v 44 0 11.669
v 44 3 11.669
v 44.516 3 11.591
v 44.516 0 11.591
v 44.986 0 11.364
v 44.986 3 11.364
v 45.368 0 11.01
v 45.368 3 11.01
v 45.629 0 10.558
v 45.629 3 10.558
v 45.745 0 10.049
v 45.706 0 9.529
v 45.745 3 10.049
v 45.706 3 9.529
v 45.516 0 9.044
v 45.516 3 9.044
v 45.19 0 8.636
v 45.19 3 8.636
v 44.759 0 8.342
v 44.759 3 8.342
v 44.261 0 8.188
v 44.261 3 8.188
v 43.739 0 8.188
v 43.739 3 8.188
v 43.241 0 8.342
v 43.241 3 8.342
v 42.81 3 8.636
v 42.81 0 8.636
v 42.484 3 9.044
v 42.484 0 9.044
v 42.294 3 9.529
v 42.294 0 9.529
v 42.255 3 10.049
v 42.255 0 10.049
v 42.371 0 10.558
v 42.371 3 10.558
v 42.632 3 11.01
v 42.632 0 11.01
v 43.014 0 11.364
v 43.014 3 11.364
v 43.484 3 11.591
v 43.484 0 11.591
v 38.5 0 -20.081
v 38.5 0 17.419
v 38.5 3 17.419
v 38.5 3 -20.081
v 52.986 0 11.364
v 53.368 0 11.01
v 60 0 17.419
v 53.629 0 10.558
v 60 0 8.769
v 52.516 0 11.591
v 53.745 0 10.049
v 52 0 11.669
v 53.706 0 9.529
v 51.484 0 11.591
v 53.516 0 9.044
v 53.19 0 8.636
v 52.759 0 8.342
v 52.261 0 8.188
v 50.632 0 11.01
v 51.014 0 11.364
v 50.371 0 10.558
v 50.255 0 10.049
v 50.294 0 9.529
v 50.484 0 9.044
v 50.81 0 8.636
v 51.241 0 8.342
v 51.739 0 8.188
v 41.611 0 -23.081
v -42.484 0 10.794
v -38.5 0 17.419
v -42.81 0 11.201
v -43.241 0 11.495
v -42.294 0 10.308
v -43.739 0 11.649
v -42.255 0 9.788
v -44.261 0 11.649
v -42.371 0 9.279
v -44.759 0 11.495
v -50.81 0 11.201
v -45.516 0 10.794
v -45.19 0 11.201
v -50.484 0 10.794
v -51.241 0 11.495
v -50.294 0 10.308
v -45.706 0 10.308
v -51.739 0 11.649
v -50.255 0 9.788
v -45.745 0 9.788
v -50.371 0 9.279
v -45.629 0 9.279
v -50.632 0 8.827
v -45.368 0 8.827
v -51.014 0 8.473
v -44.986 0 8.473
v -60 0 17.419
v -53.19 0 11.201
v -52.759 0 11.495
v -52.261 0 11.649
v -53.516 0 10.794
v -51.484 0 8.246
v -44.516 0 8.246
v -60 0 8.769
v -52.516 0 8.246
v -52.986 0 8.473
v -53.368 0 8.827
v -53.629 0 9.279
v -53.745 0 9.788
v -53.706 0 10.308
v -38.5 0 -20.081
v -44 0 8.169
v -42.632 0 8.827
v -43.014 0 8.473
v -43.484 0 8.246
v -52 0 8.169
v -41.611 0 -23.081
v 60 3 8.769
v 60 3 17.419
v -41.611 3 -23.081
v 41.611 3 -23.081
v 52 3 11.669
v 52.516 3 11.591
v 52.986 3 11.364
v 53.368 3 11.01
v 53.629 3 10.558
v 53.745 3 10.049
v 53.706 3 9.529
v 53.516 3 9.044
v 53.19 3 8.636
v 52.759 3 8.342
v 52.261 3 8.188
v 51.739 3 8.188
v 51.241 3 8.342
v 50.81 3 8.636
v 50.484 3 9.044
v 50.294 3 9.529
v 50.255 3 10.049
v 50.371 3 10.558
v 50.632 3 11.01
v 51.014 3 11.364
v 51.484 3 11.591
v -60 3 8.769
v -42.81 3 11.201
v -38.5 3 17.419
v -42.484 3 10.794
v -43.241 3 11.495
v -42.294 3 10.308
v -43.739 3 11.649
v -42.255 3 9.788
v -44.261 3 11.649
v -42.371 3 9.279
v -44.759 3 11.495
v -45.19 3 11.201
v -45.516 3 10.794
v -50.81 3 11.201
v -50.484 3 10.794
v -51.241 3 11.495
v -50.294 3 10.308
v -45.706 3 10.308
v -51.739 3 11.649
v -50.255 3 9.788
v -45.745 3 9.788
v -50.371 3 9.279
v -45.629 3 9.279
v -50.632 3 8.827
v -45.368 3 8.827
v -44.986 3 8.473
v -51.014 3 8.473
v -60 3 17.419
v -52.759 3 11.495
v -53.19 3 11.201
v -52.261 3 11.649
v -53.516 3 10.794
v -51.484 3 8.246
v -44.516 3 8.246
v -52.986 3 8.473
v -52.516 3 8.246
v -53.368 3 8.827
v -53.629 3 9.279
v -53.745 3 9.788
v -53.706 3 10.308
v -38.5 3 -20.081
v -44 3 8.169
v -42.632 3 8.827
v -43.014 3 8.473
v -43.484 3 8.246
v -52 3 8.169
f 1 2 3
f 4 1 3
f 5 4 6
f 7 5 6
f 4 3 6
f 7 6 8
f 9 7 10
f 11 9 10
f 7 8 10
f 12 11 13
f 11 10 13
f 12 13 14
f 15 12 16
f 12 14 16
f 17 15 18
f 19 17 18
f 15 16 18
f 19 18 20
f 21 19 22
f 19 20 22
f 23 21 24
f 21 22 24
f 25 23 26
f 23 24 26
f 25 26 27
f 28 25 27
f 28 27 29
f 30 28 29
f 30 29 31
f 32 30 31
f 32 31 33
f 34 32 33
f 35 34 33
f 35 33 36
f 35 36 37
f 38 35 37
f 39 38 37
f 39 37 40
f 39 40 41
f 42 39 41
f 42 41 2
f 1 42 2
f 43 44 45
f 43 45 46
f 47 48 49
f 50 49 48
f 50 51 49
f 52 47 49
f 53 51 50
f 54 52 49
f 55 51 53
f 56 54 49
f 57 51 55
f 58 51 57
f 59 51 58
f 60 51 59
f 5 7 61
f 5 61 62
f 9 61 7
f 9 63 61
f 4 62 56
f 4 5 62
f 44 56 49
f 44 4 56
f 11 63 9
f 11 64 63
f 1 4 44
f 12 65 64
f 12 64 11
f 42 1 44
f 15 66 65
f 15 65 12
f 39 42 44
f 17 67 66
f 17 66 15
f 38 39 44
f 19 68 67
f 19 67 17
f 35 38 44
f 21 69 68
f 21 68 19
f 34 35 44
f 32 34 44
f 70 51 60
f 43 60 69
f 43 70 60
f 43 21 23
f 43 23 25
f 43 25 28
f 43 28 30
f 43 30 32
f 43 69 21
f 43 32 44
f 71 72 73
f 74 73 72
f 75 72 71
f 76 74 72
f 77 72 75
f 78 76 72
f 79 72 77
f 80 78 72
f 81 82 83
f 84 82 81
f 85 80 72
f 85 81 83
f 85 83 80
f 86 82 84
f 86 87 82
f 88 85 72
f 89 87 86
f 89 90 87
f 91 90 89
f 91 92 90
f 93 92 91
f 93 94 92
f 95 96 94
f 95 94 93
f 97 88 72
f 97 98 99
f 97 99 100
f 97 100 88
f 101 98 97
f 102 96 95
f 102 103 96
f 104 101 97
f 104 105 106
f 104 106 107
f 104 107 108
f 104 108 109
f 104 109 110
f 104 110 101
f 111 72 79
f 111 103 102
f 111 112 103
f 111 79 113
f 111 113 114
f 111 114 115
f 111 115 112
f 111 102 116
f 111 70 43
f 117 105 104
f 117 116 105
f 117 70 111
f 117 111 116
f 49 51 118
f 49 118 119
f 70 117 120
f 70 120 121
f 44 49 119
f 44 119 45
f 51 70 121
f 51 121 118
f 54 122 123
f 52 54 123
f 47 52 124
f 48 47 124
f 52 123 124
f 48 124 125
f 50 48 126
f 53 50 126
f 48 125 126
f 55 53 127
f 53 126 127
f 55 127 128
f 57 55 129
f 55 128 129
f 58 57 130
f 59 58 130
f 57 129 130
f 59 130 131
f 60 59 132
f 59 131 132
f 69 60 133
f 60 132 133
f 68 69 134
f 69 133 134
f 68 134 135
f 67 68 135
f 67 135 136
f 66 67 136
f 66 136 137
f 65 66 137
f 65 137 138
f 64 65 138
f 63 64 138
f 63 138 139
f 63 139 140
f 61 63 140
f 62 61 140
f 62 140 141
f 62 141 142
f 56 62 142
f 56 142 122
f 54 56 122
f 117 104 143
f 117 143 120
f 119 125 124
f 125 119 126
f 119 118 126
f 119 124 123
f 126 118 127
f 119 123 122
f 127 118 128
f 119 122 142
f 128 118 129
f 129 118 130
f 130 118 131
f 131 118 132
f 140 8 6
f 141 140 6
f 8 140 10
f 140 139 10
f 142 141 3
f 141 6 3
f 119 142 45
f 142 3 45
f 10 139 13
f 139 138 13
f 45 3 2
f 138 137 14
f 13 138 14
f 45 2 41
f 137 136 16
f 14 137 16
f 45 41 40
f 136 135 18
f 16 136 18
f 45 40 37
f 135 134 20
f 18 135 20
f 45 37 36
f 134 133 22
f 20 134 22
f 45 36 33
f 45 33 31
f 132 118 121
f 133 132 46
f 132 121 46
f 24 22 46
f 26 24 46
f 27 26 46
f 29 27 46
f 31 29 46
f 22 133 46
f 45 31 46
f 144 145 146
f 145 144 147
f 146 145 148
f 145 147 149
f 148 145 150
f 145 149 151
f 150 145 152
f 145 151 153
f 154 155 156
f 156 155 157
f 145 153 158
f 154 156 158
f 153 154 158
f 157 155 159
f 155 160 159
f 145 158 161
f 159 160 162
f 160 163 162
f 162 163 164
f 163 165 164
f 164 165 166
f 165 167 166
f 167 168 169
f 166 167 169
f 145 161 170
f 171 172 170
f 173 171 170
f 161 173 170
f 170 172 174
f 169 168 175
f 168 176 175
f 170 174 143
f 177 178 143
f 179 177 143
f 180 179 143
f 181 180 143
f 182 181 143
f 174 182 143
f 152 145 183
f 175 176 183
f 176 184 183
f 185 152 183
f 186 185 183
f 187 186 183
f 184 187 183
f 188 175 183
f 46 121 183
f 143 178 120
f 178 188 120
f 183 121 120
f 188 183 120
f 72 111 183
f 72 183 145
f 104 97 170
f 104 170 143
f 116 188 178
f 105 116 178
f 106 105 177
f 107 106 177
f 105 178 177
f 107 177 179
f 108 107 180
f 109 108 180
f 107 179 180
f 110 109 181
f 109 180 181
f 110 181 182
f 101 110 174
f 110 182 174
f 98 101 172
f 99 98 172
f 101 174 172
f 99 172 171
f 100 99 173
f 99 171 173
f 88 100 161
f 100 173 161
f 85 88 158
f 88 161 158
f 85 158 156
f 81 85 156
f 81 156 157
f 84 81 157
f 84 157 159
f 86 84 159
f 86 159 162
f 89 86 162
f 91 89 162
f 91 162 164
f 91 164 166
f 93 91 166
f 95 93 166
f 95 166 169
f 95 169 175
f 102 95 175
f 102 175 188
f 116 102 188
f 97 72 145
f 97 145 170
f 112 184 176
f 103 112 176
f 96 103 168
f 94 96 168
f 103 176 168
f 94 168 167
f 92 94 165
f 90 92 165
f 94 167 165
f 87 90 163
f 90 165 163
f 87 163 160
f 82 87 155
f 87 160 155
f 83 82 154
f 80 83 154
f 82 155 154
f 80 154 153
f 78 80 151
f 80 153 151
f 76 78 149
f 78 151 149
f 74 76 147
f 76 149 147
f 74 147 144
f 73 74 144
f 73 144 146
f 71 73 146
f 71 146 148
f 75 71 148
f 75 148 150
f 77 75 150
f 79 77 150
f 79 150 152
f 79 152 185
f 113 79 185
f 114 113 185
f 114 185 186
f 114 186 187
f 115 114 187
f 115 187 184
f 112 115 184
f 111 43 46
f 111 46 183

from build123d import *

# Parameters (mm, degrees)
BOSS_EXTRUDE1_DEPTH = 3
SKETCH2_R           = 1.75
CUT_EXTRUDE1_DEPTH  = 65.356450115


with BuildPart() as part:
    # Sketch1 → Boss-Extrude1 (new body)
    with BuildSketch(Plane(origin=(0, 0, 0), x_dir=(1, 0, 0), z_dir=(0, 1, 0))):
        Polygon((-41.611393926, 23.081435644), (41.611393926, 23.081435644), (60, -8.768564356), (60, -17.418564356), (38.5, -17.418564356), (38.5, 20.081435644), (-38.5, 20.081435644), (-38.5, -17.418564356), (-60, -17.418564356), (-60, -8.768564356), align=None)
    extrude(amount=BOSS_EXTRUDE1_DEPTH)

    # Sketch2 → Cut-Extrude1 (cut, through all)
    with BuildSketch(Plane(origin=(0, 3, 0), x_dir=(1, 0, 0), z_dir=(0, 1, 0))):
        with Locations(Location((52, -9.918564356, 0), (0, 0, 270))):
            Circle(SKETCH2_R)
        with Locations(Location((44, -9.918564356, 0), (0, 0, 270))):
            Circle(SKETCH2_R)
        with Locations(Location((-52, -9.918564356, 0), (0, 0, 90))):
            Circle(SKETCH2_R)
        with Locations(Location((-44, -9.918564356, 0), (0, 0, 90))):
            Circle(SKETCH2_R)
    extrude(amount=-CUT_EXTRUDE1_DEPTH, mode=Mode.SUBTRACT)


solid = part.part
